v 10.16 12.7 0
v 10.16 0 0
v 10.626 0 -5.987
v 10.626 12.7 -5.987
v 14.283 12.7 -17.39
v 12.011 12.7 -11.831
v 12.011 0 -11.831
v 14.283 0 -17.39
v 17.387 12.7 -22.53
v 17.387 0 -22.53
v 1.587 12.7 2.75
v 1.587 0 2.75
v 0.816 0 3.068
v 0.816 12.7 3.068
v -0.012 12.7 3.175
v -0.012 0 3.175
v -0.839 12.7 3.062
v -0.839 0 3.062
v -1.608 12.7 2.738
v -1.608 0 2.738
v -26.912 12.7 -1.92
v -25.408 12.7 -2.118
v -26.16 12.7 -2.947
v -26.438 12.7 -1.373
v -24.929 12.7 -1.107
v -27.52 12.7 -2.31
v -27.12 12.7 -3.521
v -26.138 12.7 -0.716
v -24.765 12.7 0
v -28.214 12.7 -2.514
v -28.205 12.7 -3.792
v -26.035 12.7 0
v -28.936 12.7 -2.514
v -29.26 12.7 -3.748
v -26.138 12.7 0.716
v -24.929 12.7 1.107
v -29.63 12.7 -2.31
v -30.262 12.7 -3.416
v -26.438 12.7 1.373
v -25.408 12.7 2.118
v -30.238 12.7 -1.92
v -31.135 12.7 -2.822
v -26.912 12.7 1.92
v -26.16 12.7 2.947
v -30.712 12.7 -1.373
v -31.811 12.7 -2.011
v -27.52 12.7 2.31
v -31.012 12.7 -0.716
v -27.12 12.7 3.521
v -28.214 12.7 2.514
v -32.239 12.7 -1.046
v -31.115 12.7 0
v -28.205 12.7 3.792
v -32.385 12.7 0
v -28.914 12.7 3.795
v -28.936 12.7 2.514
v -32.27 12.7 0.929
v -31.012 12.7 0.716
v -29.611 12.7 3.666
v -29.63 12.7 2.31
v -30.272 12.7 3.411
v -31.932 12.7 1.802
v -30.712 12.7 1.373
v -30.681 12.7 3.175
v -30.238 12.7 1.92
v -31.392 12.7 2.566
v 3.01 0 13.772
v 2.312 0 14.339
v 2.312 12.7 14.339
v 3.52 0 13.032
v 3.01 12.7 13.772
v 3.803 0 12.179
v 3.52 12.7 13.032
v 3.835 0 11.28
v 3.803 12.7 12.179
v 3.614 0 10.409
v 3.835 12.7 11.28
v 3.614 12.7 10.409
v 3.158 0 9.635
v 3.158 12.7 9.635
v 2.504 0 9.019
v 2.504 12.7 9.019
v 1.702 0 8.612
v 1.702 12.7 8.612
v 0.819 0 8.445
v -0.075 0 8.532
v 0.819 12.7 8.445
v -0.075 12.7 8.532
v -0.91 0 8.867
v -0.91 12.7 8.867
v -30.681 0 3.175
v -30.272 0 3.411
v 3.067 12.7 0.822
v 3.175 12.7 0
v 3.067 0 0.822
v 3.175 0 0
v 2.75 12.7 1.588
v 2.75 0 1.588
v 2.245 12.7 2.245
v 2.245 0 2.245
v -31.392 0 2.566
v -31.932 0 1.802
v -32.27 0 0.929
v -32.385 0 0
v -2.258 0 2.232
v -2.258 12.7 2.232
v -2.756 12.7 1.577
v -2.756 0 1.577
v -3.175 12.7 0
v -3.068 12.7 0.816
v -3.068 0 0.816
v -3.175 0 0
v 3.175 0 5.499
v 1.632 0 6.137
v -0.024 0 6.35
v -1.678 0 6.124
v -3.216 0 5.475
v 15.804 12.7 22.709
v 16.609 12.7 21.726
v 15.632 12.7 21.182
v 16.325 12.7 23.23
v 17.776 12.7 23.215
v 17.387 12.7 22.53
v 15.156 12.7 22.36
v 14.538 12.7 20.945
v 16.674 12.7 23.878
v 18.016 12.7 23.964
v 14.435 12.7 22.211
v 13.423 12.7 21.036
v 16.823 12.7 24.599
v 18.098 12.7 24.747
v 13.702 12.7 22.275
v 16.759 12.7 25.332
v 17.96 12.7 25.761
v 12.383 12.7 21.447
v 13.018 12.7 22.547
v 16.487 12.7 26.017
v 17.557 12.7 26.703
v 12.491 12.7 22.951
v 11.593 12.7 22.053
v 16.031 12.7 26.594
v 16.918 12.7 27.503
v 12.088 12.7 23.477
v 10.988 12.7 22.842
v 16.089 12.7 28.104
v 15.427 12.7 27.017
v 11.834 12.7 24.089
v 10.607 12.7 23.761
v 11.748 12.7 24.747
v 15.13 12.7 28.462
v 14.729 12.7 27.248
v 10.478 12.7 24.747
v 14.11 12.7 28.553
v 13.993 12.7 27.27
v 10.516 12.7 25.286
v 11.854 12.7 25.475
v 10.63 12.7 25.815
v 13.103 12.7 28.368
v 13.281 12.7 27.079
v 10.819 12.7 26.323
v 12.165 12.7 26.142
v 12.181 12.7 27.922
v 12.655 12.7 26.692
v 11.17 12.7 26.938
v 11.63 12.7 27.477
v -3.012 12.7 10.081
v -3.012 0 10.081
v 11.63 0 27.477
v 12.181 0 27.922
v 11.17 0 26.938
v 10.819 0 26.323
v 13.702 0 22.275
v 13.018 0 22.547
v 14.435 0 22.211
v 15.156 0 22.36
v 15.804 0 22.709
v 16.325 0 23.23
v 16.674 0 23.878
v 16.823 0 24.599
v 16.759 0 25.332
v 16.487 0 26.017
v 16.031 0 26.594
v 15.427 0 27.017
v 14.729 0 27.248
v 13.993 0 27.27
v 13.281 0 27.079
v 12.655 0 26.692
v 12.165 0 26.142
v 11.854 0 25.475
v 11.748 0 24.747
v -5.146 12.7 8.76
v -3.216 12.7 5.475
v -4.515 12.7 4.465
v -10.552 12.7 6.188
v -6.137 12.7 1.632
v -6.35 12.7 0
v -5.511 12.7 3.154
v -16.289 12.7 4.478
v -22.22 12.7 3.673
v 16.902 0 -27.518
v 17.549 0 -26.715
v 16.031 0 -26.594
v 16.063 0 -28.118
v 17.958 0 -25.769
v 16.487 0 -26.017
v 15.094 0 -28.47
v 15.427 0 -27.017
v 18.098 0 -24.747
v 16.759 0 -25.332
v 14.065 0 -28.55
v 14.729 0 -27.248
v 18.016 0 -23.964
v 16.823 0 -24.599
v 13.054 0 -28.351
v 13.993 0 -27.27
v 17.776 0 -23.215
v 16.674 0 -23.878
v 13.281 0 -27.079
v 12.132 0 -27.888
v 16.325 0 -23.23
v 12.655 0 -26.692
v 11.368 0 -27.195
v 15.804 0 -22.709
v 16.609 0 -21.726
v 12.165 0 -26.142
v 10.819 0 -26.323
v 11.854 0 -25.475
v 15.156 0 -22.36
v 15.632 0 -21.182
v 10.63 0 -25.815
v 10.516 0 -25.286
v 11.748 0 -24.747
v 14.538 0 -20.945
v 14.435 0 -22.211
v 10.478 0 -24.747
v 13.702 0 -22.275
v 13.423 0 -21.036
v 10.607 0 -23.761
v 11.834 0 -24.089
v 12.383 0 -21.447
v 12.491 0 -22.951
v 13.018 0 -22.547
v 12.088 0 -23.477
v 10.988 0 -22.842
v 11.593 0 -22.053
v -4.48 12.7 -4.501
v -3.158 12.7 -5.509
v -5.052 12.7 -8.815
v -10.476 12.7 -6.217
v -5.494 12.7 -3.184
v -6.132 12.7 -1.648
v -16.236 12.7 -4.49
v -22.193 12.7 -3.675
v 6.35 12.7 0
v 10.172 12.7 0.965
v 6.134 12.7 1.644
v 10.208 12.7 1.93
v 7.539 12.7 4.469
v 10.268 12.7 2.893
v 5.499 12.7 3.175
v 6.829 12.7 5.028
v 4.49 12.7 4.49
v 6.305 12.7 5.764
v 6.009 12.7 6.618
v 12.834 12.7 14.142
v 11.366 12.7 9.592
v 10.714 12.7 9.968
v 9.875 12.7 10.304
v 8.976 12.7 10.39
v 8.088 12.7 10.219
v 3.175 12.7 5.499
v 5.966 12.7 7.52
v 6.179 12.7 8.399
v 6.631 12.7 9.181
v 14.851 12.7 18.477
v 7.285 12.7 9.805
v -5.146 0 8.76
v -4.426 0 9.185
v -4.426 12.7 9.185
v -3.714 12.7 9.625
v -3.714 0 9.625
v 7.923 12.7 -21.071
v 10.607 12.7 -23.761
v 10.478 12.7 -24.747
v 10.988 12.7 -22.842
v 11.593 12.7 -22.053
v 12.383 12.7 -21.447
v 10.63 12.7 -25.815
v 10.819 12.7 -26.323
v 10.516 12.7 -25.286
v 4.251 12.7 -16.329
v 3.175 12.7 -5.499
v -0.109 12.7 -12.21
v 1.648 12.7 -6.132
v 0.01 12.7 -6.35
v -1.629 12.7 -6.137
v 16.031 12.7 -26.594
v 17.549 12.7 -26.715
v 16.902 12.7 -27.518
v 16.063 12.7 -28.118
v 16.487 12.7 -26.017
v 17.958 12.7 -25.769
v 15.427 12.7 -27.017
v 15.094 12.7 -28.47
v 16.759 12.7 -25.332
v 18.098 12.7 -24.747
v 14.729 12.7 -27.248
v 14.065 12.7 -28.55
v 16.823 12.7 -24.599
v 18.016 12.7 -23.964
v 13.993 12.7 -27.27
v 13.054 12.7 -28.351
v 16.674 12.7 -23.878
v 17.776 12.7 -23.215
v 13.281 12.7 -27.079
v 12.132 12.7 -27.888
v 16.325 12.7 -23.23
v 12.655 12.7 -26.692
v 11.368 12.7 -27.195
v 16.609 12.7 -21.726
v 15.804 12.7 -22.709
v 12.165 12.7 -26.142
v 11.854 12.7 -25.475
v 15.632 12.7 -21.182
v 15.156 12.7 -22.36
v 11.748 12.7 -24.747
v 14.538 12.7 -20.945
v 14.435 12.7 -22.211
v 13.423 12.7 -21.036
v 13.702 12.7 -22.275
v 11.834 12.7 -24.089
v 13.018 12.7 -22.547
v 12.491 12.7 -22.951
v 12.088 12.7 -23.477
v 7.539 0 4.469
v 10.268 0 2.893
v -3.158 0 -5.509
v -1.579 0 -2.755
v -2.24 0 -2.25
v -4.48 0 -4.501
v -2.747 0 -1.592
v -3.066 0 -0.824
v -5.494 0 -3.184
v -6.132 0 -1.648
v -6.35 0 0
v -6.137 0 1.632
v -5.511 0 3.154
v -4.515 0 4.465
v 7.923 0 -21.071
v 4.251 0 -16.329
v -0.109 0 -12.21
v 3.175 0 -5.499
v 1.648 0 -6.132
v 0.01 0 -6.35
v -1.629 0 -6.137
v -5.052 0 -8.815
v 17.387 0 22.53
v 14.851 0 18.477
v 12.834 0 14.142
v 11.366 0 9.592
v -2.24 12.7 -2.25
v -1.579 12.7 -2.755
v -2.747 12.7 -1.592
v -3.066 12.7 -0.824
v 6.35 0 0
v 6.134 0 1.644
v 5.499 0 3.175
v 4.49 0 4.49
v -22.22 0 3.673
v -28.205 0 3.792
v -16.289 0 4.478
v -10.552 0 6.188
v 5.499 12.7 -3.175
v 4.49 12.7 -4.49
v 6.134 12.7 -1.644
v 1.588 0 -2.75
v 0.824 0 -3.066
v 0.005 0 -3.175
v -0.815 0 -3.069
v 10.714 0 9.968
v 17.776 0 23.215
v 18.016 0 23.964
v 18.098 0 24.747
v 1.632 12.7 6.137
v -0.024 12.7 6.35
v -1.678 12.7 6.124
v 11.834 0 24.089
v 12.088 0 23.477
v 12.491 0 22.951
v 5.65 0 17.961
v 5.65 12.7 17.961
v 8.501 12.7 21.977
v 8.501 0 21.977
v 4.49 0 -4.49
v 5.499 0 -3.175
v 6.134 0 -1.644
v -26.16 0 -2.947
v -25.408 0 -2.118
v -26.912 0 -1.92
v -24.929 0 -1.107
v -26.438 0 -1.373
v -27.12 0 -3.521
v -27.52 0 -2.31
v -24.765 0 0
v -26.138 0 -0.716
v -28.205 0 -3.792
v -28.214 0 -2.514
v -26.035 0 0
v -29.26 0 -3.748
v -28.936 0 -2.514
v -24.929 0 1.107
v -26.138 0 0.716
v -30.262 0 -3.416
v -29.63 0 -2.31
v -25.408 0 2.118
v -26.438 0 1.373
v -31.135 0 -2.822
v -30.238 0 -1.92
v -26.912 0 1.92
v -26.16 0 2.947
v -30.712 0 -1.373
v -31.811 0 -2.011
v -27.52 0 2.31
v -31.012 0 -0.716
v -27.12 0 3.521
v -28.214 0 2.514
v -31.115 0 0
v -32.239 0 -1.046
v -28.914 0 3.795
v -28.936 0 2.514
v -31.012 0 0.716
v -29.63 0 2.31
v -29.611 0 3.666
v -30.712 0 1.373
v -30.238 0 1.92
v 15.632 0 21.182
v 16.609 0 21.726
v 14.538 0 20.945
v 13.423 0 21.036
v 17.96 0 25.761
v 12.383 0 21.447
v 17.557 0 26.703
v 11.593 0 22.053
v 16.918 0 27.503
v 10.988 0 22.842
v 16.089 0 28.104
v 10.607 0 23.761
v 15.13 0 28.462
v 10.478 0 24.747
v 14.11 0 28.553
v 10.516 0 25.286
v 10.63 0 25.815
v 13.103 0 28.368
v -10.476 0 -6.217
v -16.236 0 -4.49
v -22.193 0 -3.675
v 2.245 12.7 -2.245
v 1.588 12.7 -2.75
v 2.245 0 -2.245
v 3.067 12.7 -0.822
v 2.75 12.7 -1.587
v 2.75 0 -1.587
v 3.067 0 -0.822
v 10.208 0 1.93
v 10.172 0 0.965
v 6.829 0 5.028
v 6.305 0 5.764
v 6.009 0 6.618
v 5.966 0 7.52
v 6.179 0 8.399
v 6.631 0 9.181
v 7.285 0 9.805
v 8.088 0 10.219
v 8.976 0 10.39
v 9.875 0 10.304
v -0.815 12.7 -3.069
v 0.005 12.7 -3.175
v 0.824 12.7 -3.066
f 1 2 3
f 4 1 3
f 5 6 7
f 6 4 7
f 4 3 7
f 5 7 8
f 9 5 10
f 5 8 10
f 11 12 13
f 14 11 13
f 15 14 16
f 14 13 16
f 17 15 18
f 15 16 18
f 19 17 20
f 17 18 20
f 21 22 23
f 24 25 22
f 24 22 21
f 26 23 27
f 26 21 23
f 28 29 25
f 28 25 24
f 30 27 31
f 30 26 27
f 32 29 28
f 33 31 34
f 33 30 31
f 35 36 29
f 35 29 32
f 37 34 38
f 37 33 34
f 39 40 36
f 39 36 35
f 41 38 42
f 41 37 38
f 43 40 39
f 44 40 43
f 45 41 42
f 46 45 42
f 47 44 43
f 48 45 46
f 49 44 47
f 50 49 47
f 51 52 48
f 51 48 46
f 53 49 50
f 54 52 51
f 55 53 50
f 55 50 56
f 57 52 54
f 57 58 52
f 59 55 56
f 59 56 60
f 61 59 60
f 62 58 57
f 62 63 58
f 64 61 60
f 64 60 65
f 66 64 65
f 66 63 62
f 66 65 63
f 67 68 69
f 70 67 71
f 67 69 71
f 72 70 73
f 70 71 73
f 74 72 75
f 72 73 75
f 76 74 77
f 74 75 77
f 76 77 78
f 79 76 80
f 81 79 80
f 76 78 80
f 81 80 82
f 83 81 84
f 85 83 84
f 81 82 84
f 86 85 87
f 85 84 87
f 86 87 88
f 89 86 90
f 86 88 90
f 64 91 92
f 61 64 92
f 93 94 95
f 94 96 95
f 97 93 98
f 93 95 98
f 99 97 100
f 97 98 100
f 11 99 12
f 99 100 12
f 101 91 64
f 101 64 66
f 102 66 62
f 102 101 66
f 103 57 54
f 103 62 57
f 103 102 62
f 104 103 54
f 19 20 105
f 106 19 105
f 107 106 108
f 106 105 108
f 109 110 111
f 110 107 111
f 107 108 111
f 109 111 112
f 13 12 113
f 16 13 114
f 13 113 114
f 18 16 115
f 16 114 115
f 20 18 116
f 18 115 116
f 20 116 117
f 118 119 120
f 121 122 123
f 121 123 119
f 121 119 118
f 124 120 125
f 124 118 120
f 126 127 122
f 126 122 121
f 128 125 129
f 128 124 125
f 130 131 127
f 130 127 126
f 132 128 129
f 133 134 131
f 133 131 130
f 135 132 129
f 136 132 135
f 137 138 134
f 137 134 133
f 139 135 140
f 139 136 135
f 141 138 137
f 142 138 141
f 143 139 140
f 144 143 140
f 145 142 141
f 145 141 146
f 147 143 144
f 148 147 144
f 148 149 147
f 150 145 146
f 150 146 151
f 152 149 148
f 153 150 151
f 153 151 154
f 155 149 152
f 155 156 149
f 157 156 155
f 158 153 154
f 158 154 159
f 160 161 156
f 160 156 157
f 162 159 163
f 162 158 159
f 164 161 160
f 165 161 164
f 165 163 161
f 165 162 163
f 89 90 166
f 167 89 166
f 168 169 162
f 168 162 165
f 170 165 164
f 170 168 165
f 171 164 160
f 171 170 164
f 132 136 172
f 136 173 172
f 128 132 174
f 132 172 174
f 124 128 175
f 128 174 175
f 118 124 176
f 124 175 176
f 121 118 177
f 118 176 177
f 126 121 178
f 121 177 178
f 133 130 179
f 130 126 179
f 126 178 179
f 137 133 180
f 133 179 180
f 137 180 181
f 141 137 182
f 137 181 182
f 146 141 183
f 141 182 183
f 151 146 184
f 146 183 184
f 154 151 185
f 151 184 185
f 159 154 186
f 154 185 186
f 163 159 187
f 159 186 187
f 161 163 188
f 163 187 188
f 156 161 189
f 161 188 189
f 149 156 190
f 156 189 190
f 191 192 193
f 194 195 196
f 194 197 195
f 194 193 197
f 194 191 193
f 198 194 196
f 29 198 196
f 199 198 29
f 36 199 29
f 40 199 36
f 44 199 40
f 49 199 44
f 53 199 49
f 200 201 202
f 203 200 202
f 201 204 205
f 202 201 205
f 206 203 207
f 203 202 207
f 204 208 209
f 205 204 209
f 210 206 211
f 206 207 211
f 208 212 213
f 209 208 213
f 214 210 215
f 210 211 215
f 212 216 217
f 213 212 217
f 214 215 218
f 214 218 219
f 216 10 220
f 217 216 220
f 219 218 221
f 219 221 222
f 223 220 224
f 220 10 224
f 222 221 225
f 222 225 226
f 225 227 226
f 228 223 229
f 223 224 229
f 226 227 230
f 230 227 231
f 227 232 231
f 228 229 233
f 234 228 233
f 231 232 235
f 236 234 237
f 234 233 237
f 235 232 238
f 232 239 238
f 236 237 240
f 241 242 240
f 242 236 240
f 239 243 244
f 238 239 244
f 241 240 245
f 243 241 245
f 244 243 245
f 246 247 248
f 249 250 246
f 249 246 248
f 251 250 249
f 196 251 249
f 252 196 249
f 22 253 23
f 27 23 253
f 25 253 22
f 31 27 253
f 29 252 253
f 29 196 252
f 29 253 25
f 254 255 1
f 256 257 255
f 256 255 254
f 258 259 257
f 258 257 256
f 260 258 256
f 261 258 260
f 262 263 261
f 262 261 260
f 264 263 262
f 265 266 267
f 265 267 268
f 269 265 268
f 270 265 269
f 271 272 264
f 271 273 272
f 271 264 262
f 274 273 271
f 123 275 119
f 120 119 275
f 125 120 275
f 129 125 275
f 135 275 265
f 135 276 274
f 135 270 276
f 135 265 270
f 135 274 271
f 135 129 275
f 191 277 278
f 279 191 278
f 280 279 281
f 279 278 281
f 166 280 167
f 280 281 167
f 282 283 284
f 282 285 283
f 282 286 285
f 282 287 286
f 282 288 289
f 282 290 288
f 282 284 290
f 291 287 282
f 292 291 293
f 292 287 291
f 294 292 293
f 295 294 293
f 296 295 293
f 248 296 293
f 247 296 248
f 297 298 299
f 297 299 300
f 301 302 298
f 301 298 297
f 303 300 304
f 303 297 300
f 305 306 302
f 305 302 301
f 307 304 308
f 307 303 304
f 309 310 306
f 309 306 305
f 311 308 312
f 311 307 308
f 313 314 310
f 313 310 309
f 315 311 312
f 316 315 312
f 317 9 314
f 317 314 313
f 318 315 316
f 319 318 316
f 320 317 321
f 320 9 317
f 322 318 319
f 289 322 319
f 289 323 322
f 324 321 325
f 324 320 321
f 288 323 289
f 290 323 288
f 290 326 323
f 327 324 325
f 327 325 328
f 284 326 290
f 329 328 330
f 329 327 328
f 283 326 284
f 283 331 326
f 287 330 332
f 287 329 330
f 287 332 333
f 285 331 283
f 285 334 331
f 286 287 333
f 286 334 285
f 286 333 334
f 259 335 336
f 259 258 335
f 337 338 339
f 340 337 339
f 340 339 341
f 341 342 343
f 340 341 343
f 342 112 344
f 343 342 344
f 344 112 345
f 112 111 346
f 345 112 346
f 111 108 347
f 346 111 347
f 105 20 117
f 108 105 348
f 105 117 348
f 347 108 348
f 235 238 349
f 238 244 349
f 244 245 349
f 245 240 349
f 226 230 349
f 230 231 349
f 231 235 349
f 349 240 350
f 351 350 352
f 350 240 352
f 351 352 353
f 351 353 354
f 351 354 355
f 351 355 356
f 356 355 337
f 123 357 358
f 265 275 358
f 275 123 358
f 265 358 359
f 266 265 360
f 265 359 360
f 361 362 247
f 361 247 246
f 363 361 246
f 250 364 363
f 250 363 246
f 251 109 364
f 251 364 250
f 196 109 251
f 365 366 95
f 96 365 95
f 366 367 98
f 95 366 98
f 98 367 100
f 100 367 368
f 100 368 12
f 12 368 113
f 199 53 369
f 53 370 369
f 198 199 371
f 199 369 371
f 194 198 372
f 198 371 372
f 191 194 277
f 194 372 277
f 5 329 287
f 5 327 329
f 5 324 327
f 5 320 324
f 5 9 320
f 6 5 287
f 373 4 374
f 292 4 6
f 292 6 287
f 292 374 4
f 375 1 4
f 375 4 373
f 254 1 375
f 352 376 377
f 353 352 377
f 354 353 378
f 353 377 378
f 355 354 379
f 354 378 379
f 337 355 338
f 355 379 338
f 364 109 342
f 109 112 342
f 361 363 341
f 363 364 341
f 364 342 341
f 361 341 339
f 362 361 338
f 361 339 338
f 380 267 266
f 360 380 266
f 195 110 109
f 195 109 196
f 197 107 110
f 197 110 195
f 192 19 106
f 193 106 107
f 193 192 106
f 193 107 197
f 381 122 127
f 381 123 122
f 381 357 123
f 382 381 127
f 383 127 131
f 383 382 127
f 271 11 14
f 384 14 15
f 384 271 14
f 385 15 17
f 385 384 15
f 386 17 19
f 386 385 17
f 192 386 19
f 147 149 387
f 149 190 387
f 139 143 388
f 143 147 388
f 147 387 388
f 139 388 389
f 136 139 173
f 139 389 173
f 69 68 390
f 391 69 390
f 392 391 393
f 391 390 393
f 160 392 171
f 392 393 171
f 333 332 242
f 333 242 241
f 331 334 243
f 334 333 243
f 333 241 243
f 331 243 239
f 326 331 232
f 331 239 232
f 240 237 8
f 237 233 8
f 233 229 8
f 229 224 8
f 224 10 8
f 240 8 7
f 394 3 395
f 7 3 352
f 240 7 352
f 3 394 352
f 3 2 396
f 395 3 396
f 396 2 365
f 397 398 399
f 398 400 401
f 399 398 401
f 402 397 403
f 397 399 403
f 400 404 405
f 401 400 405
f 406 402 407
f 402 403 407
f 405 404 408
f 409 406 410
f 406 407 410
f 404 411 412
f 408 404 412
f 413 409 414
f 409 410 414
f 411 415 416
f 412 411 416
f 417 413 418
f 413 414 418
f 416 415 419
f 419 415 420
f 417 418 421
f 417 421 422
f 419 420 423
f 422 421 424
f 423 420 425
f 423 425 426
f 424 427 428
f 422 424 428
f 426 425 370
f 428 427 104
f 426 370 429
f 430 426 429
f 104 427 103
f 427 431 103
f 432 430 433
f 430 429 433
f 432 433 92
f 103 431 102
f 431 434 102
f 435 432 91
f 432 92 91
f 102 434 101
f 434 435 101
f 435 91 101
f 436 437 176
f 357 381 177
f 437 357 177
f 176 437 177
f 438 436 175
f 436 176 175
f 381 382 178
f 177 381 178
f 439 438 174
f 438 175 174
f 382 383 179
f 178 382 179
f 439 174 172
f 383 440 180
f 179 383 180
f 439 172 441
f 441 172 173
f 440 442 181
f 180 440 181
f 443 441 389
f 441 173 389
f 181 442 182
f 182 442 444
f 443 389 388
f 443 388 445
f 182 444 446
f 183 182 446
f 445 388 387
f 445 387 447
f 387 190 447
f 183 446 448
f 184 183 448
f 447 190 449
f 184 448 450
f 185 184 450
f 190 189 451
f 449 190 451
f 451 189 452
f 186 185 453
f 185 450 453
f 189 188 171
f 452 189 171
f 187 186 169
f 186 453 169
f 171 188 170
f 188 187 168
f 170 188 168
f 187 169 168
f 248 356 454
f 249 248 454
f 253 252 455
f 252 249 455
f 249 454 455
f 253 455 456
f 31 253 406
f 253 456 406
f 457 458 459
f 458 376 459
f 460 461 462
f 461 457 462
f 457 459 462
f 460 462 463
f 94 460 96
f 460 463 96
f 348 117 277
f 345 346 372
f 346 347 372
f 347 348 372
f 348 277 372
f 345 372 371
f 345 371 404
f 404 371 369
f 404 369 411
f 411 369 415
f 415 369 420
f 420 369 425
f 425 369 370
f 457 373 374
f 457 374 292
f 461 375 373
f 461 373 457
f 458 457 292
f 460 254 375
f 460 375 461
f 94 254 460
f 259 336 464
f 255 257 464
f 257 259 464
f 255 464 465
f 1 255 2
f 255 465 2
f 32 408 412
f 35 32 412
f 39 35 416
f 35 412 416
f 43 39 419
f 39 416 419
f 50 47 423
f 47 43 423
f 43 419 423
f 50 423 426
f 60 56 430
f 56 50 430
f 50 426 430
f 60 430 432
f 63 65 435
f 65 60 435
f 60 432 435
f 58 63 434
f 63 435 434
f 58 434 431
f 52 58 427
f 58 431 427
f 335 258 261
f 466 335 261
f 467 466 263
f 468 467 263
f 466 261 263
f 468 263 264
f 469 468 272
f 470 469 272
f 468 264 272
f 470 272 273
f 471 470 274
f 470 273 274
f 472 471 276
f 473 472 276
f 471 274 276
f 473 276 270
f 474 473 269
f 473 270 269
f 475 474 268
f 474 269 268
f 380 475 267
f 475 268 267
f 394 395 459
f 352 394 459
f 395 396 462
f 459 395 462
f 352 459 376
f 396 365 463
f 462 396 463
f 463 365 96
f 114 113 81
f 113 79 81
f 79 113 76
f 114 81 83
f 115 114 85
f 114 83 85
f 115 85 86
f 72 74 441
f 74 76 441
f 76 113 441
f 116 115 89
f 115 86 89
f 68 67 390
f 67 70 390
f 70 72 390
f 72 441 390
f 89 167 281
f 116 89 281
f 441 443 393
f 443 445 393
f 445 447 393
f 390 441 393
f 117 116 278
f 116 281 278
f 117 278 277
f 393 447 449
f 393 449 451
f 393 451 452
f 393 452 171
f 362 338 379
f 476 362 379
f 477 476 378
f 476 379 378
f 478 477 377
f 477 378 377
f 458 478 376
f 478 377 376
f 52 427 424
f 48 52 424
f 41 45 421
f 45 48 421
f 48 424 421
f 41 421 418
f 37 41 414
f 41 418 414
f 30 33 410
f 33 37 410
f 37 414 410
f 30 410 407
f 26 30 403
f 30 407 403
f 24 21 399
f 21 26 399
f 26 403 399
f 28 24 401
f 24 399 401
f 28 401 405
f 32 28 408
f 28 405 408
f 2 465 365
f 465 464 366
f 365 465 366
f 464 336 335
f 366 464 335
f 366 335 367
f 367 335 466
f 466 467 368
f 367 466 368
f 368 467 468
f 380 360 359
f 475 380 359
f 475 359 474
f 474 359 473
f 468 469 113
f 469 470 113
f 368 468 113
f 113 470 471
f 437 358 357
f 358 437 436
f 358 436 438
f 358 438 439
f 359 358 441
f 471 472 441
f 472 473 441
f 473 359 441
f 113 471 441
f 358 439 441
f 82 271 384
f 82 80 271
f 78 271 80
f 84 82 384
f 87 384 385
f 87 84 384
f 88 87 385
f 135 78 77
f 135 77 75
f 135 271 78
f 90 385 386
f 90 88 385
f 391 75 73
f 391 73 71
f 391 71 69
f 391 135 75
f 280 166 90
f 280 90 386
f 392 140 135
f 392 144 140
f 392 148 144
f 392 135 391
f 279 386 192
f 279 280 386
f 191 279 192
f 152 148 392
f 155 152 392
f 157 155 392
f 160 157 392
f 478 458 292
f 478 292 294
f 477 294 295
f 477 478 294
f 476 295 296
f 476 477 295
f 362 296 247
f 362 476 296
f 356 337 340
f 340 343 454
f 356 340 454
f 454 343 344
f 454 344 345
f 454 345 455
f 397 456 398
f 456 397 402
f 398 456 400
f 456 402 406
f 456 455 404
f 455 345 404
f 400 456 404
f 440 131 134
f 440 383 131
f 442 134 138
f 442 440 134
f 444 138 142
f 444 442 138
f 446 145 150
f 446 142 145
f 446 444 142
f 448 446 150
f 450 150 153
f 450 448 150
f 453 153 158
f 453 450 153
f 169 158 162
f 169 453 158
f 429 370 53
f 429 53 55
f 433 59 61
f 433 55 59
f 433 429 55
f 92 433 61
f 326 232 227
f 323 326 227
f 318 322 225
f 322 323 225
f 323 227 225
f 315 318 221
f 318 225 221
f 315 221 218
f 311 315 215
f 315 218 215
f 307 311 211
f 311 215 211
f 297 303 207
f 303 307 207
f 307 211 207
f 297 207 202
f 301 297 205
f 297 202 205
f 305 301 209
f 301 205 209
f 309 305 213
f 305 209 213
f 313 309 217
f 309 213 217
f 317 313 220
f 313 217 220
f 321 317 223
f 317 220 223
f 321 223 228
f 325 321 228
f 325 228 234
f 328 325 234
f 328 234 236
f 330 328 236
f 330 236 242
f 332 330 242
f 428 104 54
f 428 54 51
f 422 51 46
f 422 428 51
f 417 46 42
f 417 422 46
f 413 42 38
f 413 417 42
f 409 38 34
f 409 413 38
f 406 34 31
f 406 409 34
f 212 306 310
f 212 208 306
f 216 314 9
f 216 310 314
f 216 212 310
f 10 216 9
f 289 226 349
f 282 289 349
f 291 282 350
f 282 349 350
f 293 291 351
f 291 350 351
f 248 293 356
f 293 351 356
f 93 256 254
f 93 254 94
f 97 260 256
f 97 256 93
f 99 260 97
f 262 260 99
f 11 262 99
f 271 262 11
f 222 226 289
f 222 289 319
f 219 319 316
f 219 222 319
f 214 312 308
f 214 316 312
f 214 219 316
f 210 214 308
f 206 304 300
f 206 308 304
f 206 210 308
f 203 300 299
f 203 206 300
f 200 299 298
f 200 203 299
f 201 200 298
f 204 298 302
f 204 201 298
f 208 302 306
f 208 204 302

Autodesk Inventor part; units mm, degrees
ref_plane "YZ Plane" through (0, 0, 0) normal (1, 0, 0) x (0, 1, 0)
ref_plane "XZ Plane" through (0, 0, 0) normal (0, 1, 0) x (-1, 0, 0)
ref_plane "XY Plane" through (0, 0, 0) normal (0, 0, 1) x (1, 0, 0)
sketch "Sketch1" plane through (0, 0, 0) normal (0, 1, 0) x (-1, 0, 0)
  line L0 (0, 0) -> (28.575, 0)
  line L1 (28.575, 0) -> (0, 0)
  line L2 (0, 0) -> (-14.2875, -24.7467)
  line L3 (0, 0) -> (28.575, 0) construction
  line L4 (0, 0) -> (-14.2875, 24.7467)
  line L5 (0, 0) -> (28.575, 0) construction
  circle A0 centre (28.575, 0) radius 2.54
  circle A1 centre (-14.2875, -24.7467) radius 2.54
  circle A2 centre (-14.2875, 24.7467) radius 2.54
  circle A3 centre (0, 0) radius 3.175
  circle A4 centre (0, 0) radius 6.35
  line L6 (-1.5875, -2.7496) -> (0, 0)
  line L7 (0, 0) -> (-6.35, 0)
  circle A5 centre (-14.2875, 24.7467) radius 3.81
  circle A6 centre (28.575, 0) radius 3.81
  circle A7 centre (-14.2875, -24.7467) radius 3.81
  line L8 (30.6811, 3.175) -> (-12.1814, 27.9217)
  line L9 (28.2054, -3.792) -> (-10.8187, -26.3226)
  line L10 (-18.0975, 24.7467) -> (-18.0975, -24.7467)
  line L11 (0, 0) -> (5.0525, -8.8146)
  line L12 (0, 0) -> (5.1463, 8.7602)
  line L13 (0, 0) -> (-10.16, 0)
  arc A8 (28.2054, -3.792) -> (-10.8187, -26.3226) centre (24.4473, -42.344) ccw
  arc A9 (-10.8187, 26.3226) -> (28.2054, 3.792) centre (24.4473, 42.344) ccw
  arc A10 (-17.3867, -22.5305) -> (-17.3867, 22.5305) centre (-48.8947, 0) ccw
  point P0 (5.1074, 8.7829)
  point P1 (-10.16, 0.0317)
  point P2 (30.2716, 3.4114)
  point P3 (28.2054, 3.792)
  point P4 (-10.8187, 26.3226)
  point P5 (-17.3867, 22.5305)
  point P6 (-17.3867, -22.5305)
  dimension "d9" = 6.35
  dimension "d41" = 12.7
  dimension "d0" = 28.575
  dimension "d1" = 28.575
  dimension "d2" = 120
  dimension "d3" = 28.575
  dimension "d4" = 120
  dimension "d5" = 5.08
  dimension "d6" = 5.08
  dimension "d7" = 5.08
  dimension "d42" = 7.62
  dimension "d43" = 7.62
  dimension "d44" = 7.62
  dimension "d47" = 10.16
  dimension "d48" = 10.16
  dimension "d49" = 10.16
  dimension "d52" = 360
extrude "Extrusion4" add sketch "Sketch1" along normal blind 12.7 contours A3 L12 A4 L0 | L0 A4 L11 A3 | A3 L11 A4 L2 | L2 A4 L7 A3 | A3 L7 A4 L4 | L4 A4 L12 A3 | A4 L12 A9 A6 L0 | L0 A6 A8 L11 A4 | A4 L11 A8 A7 L2 | L2 A7 A10 L13 A4 | A4 L13 A10 A5 L4 | L4 A5 A9 L12 A4 | A6 L8 | A7 | A5 picked at (31.8987, 0.5122)
sketch "Sketch8" plane through (0, 12.7, 0) normal (0, 1, 0) x (1, 0, 0)
  circle A0 centre (0.678, -11.6167) radius 3.175 projected
  circle A1 centre (9.1268, -7.2186) radius 3.175 projected
  circle A2 centre (0.678, -11.6167) radius 3.175 projected
  circle A3 centre (9.1268, -7.2186) radius 3.175 projected
  line L0 (5.0649, -17.2561) -> (12.4117, -13.0144)
  arc A4 (17.3867, 22.5305) -> (17.3867, -22.5305) centre (48.8947, 0) ccw projected
  circle A5 centre (14.2875, -24.7467) radius 2.54 projected
  line L1 (0, 0) -> (14.2875, -24.7467)
  arc A6 (10.8187, -26.3226) -> (-28.2054, -3.792) centre (-24.4473, -42.344) ccw projected
  arc A7 (10.8187, -26.3226) -> (17.3867, -22.5305) centre (14.2875, -24.7467) ccw projected
  line L2 (9.1268, -7.2186) -> (10.7143, -9.9682)
  line L3 (9.1268, -7.2186) -> (7.5393, -4.4689)
  line L4 (0.678, -11.6167) -> (-0.9095, -8.867)
  line L5 (0.678, -11.6167) -> (2.2655, -14.3663)
  line L6 (-0.9095, -8.867) -> (-4.4671, -10.921)
  line L7 (2.2655, -14.3663) -> (-2.6369, -17.1967)
  line L8 (7.5393, -4.4689) -> (12.4407, -1.6391)
  line L9 (10.7143, -9.9682) -> (17.8581, -5.8438)
  point P0 (11.3663, -9.5918)
  point P1 (11.3414, -9.4937)
  point P2 (10.4005, -4.3102)
  point P3 (10.2682, -2.8934)
  point P4 (-0.9095, -8.867)
  point P5 (-3.012, -10.0809)
  point P6 (2.1732, -14.2063)
sketch "Sketch9" plane through (0, 12.7, 0) normal (0, 1, 0) x (1, 0, 0)
  point P0 (0, 0)
extrude "Extrusion5" cut sketch "Sketch8" against normal through all contours A0 A6 L5 L4 | L9 A1 A4 | L4 L5 A6 A0 | A0 A6 L6 | A0 L5 A6 | A4 A1 | A1 L2 L3 A4 | A1 L3 L2 | A1 L8 A4 picked at (2.2194, -14.2744)
sketch "Sketch11" plane through (0, 12.7, 0) normal (0, 1, 0) x (1, 0, 0)
  arc A0 (10.8187, -26.3226) -> (2.3124, -14.3387) centre (-24.4473, -42.344) ccw projected
  arc A1 (11.3663, -9.5918) -> (17.3867, -22.5305) centre (48.8947, 0) ccw projected
  arc A2 (10.8187, -26.3226) -> (17.3867, -22.5305) centre (14.2875, -24.7467) ccw projected
  line L0 (0, 0) -> (14.2875, -24.7467)
  circle A3 centre (14.2875, -24.7467) radius 2.54 projected
  line L1 (14.2875, -24.7467) -> (8.2579, -14.3032)
  line L2 (14.2875, -24.7467) -> (7.9375, -13.7482)
  line L3 (7.9375, -13.7482) -> (11.895, -11.4633)
  line L4 (7.9375, -13.7482) -> (3.98, -16.033)
  circle A4 centre (14.2875, 24.7467) radius 2.54 projected
  line L5 (0, 0) -> (14.2875, 24.7467)
  line L6 (14.2875, 24.7467) -> (7.9375, 13.7482)
  line L7 (7.9375, 13.7482) -> (0, 0)
  circle A5 centre (-28.575, 0) radius 2.54 projected
  line L8 (0, 0) -> (-28.575, 0)
  line L9 (-28.575, 0) -> (-15.875, 0)
  line L10 (-15.875, 0) -> (-15.875, 4.5698)
  arc A6 (-28.2054, 3.792) -> (10.8187, 26.3226) centre (-24.4473, 42.344) ccw projected
  line L11 (-15.875, 0) -> (-15.875, -4.5698)
  line L12 (7.9375, 13.7482) -> (3.98, 16.033)
  line L13 (7.9375, 13.7482) -> (11.895, 11.4633)
  arc A7 (17.3867, 22.5305) -> (10.2682, -2.8934) centre (48.8947, 0) ccw projected
  arc A8 (-28.2054, 3.792) -> (-30.6811, -3.175) centre (-28.575, 0) ccw projected
  arc A9 (-3.012, -10.0809) -> (-28.2054, -3.792) centre (-24.4473, -42.344) ccw projected
  arc A10 (-30.2716, -3.4114) -> (-28.2054, -3.792) centre (-28.575, 0) ccw projected
  line L14 (-30.6811, -3.175) -> (-30.2716, -3.4114) projected
  arc A11 (17.3867, 22.5305) -> (10.8187, 26.3226) centre (14.2875, 24.7467) ccw projected
  dimension "d65" = 12.7
  dimension "d66" = 12.7
  dimension "d67" = 12.7
properties part number "backupstability"
